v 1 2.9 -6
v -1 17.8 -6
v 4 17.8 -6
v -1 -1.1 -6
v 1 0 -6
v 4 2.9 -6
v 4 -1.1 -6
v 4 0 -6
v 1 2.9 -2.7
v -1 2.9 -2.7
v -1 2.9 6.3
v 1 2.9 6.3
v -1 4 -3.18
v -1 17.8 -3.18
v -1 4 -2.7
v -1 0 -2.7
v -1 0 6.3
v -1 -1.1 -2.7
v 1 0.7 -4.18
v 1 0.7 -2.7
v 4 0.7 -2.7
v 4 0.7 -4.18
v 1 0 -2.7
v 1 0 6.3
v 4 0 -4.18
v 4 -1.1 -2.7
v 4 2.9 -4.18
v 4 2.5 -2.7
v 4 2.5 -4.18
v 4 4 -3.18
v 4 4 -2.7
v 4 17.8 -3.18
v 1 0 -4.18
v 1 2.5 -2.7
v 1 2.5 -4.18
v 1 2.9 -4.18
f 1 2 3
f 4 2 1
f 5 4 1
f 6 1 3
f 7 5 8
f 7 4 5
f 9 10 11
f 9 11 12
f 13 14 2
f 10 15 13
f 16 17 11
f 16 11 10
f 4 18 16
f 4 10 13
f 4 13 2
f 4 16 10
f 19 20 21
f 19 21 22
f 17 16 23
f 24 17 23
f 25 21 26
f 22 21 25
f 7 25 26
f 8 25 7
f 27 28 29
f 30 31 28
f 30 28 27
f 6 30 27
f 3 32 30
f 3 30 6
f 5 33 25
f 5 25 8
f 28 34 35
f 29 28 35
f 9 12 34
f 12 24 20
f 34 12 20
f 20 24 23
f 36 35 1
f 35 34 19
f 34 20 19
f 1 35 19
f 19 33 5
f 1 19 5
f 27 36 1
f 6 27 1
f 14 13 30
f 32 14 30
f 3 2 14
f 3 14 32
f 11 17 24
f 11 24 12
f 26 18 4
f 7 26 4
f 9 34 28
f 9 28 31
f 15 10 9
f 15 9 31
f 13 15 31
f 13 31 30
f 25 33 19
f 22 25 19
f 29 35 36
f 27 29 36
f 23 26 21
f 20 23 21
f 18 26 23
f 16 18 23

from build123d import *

# Parameters (mm, degrees)
SKETCH_1_W      = 2
SKETCH_1_H      = 12
EXTRUDE_1_DEPTH = 2.9
EXTRUDE_START   = -2
SKETCH_2_W      = 1.48
SKETCH_2_H      = 1.5
SKETCH_2_H_2    = 1.8
EXTRUDE_2_DEPTH = 5
SKETCH_3_W      = 9
SKETCH_3_H      = 2.9
EXTRUDE_3_DEPTH = 2
EXTRUDE_START_2 = -5.1
SKETCH_4_W      = 2
SKETCH_4_H      = 2
EXTRUDE_4_DEPTH = 18.9
SKETCH_5_W      = 2.82
SKETCH_5_H      = 14.9
SKETCH_5_H_2    = 1.1
EXTRUDE_5_DEPTH = 5


with BuildPart() as part:
    # 草图1 → 凸台-拉伸1 (new body)
    with BuildSketch(Plane(origin=(0, 0, 0), x_dir=(1, 0, 0), z_dir=(0, 1, 0))):
        Rectangle(SKETCH_1_W, SKETCH_1_H)
    extrude(amount=EXTRUDE_1_DEPTH)

    # 草图2 → 凸台-拉伸2 (add)
    with BuildSketch(Plane(origin=(1, 0, 0), x_dir=(0, 0, -1), z_dir=(1, 0, 0)).offset(EXTRUDE_START)):
        with Locations((3.44, 3.25)):
            Rectangle(SKETCH_2_W, SKETCH_2_H)
        with Locations((3.44, -0.2)):
            Rectangle(SKETCH_2_W, SKETCH_2_H_2)
    extrude(amount=EXTRUDE_2_DEPTH)

    # 草图3 → 凸台-拉伸3 (add)
    with BuildSketch(Plane.ZY.offset(1)):
        with Locations((1.8, 1.45)):
            Rectangle(SKETCH_3_W, SKETCH_3_H)
    extrude(amount=-EXTRUDE_3_DEPTH)

    # 草图4 → 凸台-拉伸4 (add)
    with BuildSketch(Plane(origin=(0, 4, 0), x_dir=(1, 0, 0), z_dir=(0, 1, 0)).offset(EXTRUDE_START_2)):
        with Locations((0, 4.18)):
            Rectangle(SKETCH_4_W, SKETCH_4_H)
    extrude(amount=EXTRUDE_4_DEPTH)

    # 草图5 → 凸台-拉伸5 (add)
    with BuildSketch(Plane(origin=(1, 0, 0), x_dir=(0, 0, -1), z_dir=(1, 0, 0)).offset(EXTRUDE_START)):
        with Locations((4.59, 10.35)):
            Rectangle(SKETCH_5_W, SKETCH_5_H)
        with Locations((4.59, -0.55)):
            Rectangle(SKETCH_5_W, SKETCH_5_H_2)
    extrude(amount=EXTRUDE_5_DEPTH)


solid = part.part
